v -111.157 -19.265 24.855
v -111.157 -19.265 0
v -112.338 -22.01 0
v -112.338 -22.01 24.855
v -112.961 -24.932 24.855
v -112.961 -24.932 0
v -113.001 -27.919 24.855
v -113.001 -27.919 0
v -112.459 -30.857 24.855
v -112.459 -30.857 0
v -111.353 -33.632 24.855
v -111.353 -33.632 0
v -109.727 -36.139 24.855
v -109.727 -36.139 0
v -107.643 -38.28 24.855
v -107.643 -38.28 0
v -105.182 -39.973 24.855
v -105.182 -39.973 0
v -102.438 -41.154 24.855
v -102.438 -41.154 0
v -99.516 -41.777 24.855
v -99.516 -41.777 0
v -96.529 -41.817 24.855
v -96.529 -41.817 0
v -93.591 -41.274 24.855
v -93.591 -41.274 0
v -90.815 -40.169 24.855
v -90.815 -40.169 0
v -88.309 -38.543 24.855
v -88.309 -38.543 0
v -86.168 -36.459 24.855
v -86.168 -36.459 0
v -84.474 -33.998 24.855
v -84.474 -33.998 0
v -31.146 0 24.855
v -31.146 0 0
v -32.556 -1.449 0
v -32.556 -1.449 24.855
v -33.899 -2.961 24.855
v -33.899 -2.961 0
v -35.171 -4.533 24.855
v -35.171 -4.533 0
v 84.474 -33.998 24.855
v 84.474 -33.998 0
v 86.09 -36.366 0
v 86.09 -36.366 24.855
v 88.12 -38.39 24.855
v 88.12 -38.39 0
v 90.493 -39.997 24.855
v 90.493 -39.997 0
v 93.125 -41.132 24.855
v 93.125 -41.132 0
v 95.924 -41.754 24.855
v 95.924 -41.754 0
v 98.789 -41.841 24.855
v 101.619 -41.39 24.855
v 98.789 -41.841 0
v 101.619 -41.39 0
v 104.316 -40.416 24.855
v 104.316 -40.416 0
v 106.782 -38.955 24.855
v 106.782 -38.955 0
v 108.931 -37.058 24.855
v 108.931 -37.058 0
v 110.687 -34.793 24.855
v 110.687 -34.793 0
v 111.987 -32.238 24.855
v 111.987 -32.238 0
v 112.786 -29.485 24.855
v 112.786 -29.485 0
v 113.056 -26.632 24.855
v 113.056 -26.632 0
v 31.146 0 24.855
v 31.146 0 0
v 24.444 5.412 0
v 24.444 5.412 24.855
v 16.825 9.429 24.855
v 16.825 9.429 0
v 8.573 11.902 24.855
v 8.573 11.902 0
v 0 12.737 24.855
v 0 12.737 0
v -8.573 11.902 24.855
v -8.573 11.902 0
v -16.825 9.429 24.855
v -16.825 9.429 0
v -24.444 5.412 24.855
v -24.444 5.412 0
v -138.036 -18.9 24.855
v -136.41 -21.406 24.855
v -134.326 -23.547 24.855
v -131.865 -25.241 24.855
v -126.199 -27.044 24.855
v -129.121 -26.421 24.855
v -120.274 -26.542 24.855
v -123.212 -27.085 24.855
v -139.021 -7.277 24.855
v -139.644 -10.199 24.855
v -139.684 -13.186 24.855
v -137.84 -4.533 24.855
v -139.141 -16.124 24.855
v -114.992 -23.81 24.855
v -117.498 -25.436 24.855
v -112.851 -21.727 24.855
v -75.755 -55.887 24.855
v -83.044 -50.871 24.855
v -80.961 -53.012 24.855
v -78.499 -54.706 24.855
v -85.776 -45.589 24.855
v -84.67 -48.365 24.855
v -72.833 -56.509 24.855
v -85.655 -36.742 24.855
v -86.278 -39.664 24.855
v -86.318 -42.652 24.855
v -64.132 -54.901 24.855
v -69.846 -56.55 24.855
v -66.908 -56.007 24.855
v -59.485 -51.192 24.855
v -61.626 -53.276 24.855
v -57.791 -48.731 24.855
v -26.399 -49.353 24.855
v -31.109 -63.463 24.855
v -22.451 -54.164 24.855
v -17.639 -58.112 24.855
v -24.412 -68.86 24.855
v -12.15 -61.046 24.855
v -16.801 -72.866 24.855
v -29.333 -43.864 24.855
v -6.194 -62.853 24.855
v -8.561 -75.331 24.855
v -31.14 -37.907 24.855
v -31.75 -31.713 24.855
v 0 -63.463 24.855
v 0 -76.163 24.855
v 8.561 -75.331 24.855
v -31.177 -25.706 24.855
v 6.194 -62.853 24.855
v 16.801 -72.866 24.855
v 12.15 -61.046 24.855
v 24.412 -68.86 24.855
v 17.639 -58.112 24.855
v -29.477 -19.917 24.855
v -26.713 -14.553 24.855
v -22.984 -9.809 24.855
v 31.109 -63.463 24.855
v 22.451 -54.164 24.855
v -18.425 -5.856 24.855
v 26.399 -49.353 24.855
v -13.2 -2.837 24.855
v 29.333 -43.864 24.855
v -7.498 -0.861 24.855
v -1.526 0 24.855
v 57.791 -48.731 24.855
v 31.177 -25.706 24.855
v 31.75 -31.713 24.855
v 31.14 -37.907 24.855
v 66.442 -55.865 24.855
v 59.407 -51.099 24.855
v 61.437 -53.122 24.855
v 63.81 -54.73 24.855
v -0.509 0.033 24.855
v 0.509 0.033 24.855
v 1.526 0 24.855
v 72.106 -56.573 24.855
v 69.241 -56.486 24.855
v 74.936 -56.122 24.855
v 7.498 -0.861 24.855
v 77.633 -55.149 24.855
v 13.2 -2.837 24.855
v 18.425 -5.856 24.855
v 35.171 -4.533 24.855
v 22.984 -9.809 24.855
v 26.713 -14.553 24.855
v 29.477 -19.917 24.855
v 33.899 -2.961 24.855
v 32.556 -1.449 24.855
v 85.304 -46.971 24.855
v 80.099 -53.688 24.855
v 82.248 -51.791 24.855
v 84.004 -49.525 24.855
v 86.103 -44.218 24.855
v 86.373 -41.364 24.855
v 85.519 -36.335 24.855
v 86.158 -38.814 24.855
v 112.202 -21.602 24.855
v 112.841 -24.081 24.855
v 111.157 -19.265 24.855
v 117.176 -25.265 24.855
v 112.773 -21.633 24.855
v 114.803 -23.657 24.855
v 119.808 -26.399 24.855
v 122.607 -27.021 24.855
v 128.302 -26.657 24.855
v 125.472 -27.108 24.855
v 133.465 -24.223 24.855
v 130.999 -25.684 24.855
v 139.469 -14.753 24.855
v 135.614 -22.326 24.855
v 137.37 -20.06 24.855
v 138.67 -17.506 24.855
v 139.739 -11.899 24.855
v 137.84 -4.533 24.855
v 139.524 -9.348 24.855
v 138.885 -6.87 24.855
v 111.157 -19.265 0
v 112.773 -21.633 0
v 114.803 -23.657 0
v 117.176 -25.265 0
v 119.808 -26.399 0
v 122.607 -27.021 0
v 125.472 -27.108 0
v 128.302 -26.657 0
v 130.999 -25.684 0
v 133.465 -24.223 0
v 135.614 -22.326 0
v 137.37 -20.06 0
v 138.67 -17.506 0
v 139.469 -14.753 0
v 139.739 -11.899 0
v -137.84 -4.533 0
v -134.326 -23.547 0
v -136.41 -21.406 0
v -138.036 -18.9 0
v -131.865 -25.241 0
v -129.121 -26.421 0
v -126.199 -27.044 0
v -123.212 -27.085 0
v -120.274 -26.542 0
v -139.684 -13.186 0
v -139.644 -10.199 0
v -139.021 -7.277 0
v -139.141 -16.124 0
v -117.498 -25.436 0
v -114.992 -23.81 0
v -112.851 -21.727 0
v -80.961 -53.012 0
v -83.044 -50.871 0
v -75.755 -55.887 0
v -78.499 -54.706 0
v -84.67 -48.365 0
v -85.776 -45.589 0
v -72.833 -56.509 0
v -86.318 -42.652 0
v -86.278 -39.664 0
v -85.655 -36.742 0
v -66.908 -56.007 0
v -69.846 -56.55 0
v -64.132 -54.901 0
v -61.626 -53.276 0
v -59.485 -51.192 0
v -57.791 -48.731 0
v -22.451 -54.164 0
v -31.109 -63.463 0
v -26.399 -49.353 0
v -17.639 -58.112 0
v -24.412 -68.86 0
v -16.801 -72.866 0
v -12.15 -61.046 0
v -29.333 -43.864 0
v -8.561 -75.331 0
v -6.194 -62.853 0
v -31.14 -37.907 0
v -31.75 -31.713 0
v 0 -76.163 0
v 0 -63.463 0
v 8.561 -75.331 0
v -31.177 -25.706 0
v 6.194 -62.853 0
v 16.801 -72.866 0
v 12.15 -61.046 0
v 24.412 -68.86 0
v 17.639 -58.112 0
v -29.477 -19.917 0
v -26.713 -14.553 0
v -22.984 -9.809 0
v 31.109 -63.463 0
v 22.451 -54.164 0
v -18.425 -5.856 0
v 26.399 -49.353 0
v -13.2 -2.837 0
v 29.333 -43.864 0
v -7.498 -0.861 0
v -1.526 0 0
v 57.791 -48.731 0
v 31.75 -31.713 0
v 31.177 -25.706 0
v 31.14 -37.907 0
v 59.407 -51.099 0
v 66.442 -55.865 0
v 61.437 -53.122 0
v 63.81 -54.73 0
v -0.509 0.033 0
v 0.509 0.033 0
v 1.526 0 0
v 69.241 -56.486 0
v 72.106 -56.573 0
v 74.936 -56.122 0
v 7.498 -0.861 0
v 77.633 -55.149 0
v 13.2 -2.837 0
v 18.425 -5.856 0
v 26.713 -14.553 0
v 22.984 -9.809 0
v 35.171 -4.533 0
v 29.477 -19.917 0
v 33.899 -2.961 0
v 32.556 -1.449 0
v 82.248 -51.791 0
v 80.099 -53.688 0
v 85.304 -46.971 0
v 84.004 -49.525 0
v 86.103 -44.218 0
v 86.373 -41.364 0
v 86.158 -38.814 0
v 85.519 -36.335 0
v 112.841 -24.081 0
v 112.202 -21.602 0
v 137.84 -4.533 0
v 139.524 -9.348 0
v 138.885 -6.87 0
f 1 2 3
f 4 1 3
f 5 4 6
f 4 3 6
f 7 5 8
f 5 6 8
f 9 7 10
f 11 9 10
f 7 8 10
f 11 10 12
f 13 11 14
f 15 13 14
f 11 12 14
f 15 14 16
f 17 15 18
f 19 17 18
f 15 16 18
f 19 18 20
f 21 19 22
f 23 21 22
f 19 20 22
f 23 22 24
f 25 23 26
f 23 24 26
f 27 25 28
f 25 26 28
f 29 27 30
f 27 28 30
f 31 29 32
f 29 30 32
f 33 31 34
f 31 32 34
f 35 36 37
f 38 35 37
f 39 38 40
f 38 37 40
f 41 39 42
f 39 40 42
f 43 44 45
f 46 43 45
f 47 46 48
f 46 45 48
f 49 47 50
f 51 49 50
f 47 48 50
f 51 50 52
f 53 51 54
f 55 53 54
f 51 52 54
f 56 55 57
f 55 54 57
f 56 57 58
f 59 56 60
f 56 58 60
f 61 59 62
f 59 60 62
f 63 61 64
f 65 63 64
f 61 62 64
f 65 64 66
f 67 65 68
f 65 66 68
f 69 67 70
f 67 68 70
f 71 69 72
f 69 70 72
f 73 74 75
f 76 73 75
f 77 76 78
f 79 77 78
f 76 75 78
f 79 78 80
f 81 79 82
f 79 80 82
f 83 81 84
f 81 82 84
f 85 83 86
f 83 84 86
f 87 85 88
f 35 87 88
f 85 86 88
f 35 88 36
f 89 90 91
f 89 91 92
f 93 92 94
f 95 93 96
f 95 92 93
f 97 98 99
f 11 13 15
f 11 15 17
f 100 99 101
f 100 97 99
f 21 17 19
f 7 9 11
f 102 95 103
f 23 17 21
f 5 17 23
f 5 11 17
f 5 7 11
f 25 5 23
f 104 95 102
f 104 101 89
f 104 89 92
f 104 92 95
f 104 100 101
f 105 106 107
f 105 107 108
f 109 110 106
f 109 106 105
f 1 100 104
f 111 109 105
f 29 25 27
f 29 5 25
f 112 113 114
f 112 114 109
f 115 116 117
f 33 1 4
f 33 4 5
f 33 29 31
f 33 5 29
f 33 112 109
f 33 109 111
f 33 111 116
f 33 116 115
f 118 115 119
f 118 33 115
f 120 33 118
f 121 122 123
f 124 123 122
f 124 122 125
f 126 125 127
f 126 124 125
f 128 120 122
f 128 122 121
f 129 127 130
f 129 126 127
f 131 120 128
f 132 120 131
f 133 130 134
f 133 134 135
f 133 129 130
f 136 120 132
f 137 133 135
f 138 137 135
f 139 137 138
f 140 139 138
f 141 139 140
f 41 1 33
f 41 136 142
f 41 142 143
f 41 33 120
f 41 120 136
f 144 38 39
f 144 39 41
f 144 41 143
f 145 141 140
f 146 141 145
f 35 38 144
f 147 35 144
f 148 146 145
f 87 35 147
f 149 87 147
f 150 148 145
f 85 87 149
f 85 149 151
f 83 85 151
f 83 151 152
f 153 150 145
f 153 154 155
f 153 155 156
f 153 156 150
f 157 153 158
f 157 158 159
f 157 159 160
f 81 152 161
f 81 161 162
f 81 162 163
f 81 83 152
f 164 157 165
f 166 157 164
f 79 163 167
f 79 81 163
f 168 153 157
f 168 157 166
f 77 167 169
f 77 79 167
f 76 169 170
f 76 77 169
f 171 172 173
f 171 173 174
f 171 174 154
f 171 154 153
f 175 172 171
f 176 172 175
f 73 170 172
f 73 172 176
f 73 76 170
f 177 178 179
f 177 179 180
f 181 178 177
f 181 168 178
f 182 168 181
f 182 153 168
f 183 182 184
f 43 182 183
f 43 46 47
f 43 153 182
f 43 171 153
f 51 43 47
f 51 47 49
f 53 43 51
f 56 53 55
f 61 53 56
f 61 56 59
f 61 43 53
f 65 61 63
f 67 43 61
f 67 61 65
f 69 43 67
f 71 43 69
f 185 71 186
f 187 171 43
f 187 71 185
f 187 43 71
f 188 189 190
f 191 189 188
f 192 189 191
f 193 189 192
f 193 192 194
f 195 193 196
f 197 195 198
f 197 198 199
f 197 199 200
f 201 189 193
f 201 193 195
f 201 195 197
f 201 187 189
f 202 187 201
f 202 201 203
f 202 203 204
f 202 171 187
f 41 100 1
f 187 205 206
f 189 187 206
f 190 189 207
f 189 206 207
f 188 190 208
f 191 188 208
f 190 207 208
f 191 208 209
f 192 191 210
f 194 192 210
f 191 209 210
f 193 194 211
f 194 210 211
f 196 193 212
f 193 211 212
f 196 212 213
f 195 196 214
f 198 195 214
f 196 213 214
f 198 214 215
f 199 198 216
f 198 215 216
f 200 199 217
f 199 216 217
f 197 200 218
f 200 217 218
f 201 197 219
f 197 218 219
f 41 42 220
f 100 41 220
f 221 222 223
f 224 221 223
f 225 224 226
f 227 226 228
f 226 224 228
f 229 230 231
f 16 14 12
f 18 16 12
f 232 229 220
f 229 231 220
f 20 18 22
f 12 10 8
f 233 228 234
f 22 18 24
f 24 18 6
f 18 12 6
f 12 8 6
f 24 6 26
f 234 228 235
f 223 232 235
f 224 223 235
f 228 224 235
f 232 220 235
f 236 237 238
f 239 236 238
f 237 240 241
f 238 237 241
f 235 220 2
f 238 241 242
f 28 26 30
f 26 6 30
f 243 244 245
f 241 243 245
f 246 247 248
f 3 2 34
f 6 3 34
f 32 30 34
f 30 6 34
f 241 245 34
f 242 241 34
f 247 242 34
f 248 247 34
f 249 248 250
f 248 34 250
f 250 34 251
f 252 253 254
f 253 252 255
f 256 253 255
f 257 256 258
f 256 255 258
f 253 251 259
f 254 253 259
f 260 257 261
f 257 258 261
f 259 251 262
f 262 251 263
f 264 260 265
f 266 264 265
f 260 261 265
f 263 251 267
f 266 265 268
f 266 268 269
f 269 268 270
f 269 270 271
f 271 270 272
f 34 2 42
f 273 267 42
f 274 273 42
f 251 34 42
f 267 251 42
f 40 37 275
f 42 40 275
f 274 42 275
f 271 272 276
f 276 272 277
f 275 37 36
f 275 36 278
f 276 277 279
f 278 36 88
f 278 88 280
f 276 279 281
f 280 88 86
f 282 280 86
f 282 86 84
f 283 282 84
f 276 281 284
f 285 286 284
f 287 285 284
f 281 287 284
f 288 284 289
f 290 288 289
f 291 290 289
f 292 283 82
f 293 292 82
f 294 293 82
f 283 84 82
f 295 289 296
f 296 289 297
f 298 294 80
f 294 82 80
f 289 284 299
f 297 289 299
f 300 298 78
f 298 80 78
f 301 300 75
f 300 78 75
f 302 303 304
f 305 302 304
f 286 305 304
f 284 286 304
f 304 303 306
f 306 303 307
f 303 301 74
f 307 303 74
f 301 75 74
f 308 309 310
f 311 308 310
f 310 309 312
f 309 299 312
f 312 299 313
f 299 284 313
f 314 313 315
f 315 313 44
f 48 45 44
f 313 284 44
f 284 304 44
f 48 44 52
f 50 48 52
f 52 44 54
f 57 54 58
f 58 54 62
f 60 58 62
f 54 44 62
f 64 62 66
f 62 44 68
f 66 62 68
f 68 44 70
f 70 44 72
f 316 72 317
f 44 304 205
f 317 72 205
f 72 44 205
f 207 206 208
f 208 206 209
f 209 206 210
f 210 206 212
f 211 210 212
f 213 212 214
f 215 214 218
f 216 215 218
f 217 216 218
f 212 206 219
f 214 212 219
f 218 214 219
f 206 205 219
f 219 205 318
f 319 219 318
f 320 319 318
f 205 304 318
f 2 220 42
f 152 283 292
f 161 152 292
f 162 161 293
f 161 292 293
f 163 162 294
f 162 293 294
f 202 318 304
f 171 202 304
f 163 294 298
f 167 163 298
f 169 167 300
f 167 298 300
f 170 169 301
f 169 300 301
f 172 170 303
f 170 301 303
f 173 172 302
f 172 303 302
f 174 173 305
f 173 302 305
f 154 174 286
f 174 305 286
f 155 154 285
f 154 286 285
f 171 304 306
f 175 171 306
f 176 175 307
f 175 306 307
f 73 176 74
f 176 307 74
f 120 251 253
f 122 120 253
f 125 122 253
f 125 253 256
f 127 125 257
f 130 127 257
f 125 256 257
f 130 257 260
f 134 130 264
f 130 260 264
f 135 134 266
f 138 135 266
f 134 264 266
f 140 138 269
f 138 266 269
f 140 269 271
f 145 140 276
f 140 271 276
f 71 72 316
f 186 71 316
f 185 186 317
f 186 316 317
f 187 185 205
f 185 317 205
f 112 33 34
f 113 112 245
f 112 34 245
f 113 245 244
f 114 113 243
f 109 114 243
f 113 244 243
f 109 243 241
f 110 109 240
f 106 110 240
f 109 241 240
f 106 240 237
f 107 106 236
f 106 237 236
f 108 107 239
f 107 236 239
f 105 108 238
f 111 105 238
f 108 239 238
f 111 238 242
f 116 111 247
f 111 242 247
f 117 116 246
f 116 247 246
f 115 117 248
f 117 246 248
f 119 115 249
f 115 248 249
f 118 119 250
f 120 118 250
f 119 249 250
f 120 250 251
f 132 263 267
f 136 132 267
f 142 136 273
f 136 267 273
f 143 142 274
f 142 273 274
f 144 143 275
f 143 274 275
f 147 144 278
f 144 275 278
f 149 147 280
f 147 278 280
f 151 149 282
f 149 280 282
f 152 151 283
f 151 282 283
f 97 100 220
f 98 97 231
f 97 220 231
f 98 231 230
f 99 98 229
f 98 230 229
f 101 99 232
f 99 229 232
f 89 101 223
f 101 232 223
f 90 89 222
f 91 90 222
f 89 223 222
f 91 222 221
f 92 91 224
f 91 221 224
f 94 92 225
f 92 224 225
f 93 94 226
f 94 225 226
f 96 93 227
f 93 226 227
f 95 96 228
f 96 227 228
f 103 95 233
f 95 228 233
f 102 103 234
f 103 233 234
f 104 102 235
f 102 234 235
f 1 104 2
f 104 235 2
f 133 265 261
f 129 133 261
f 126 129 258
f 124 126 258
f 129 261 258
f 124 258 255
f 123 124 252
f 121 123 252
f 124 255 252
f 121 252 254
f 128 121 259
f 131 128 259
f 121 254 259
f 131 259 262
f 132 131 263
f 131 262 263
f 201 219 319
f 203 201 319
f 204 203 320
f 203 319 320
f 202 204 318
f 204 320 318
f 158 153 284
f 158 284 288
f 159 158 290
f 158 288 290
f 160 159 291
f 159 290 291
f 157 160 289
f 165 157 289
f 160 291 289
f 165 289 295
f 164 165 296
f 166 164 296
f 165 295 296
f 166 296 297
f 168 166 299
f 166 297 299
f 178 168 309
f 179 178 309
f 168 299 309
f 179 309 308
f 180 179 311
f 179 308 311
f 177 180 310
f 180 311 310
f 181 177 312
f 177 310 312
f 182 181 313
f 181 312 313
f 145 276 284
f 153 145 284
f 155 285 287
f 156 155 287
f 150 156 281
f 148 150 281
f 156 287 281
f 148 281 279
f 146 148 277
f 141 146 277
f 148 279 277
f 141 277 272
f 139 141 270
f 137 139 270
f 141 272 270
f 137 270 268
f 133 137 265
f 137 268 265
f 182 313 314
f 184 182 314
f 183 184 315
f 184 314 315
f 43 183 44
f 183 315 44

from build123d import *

# Parameters (mm, degrees)
F1_DEPTH = 24.85502


# Not quite as in the source:
# - ends of sketch curves that miss each other by under 0.0002 mm in the source are joined


with BuildPart() as f1:
    # F0 (on Top) → F1 (new body)
    with BuildSketch(Plane.XY):
        with BuildLine():
            Line((31.75, -31.7133048595), (44.45, -31.7133048595))
            ThreePointArc((44.45, -31.7133048595), (42.0664322772, -17.3530202013), (35.171359934, -4.5328350256))
            ThreePointArc((35.171359934, -4.5328350256), (33.2360090694, -2.1977123508), (31.1459274206, 0))
            Line((31.1459274206, 0), (1.526038953, 0))
            ThreePointArc((1.526038953, 0), (22.9838447258, -9.8088445461), (31.75, -31.7133048595))
        make_face()
        with BuildLine():
            Line((44.45, -40.8569961303), (44.45, -31.7133048595))
            ThreePointArc((44.45, -31.7133048595), (44.2101126583, -36.3250766164), (43.4930398768, -40.8870708405))
            ThreePointArc((43.4930398768, -40.8870708405), (43.9712837047, -40.8645166634), (44.45, -40.8569961303))
        make_face()
        with BuildLine():
            ThreePointArc((43.4930398768, -40.8870708405), (44.2101126583, -36.3250766164), (44.45, -31.7133048595))
            Line((44.45, -31.7133048595), (31.75, -31.7133048595))
            ThreePointArc((31.75, -31.7133048595), (22.4506403027, -54.1639451622), (0, -63.4633048595))
            Line((0, -63.4633048595), (31.1085197333, -63.4633048595))
            ThreePointArc((31.1085197333, -63.4633048595), (31.0883782789, -48.7672850184), (43.4930398768, -40.8870708405))
        make_face()
        with BuildLine():
            ThreePointArc((35.171359934, -4.5328350256), (42.0664322772, -17.3530202013), (44.45, -31.7133048595))
            Line((44.45, -31.7133048595), (44.45, -4.5328350256))
            Line((44.45, -4.5328350256), (35.171359934, -4.5328350256))
        make_face()
        with BuildLine():
            Line((44.45, -4.5328350256), (44.45, -31.7133048595))
            Line((44.45, -31.7133048595), (44.45, -40.8569961303))
            ThreePointArc((44.45, -40.8569961303), (52.1958071052, -42.9722076639), (57.7914802832, -48.730687431))
            ThreePointArc((57.7914802832, -48.730687431), (63.7666518684, -28.0228983697), (84.4744408875, -33.9980701011))
            ThreePointArc((84.4744408875, -33.9980701011), (90.4496122897, -13.290280973), (111.1574013682, -19.2654525473))
            ThreePointArc((111.1574013682, -19.2654525473), (109.2588815999, -11.8991437909), (111.1574013333, -4.5328350256))
            Line((111.1574013333, -4.5328350256), (44.45, -4.5328350256))
        make_face()
        with BuildLine():
            ThreePointArc((44.45, -40.8569961303), (43.9712837047, -40.8645166634), (43.4930398768, -40.8870708405))
            ThreePointArc((43.4930398768, -40.8870708405), (38.9713966864, -53.0916289358), (31.1085197333, -63.4633048595))
            Line((31.1085197333, -63.4633048595), (44.45, -56.0969961303))
            Line((44.45, -56.0969961303), (44.45, -40.8569961303))
        make_face()
        with BuildLine():
            ThreePointArc((31.1085197333, -63.4633048595), (38.9713966864, -53.0916289358), (43.4930398768, -40.8870708405))
            ThreePointArc((43.4930398768, -40.8870708405), (31.0883782789, -48.7672850184), (31.1085197333, -63.4633048595))
        make_face()
        with BuildLine():
            ThreePointArc((57.7914802832, -48.730687431), (52.1958071052, -42.9722076639), (44.45, -40.8569961303))
            Line((44.45, -40.8569961303), (44.45, -56.0969961303))
            Line((44.45, -56.0969961303), (57.7914802667, -48.7306874011))
        make_face()
        with BuildLine():
            Line((1.526038953, 0), (31.1459274206, 0))
            ThreePointArc((31.1459274206, 0), (0, 12.7366951405), (-31.1459274206, 0))
            Line((-31.1459274206, 0), (-1.526038953, 0))
            ThreePointArc((-1.526038953, 0), (0, 0.0366951405), (1.526038953, 0))
        make_face()
        with BuildLine():
            ThreePointArc((-31.1085197333, -63.4633048595), (0, -76.1633048595), (31.1085197333, -63.4633048595))
            Line((31.1085197333, -63.4633048595), (0, -63.4633048595))
            Line((0, -63.4633048595), (-31.1085197333, -63.4633048595))
        make_face()
        with BuildLine():
            Line((-31.1085197333, -63.4633048595), (0, -63.4633048595))
            ThreePointArc((0, -63.4633048595), (-22.4506403027, -54.1639451622), (-31.75, -31.7133048595))
            Line((-31.75, -31.7133048595), (-44.45, -31.7133048595))
            ThreePointArc((-44.45, -31.7133048595), (-44.2101126583, -36.3250766164), (-43.4930398768, -40.8870708405))
            ThreePointArc((-43.4930398768, -40.8870708405), (-33.340506936, -45.6645101437), (-29.21, -56.0969961303))
            ThreePointArc((-29.21, -56.0969961303), (-29.6922603481, -59.9005103432), (-31.1085197333, -63.4633048595))
        make_face()
        with BuildLine():
            Line((137.8403618666, -4.5328350256), (111.1574013333, -4.5328350256))
            ThreePointArc((111.1574013333, -4.5328350256), (109.2588815999, -11.8991437909), (111.1574013682, -19.2654525473))
            Line((111.1574013333, -19.2654524841), (137.8403618666, -4.5328350256))
        make_face()
        with BuildLine():
            ThreePointArc((84.4744408875, -33.9980701011), (63.7666518684, -28.0228983697), (57.7914802832, -48.730687431))
            Line((57.7914802832, -48.730687431), (84.4744408875, -33.9980701011))
        make_face()
        with BuildLine():
            Line((84.4744408, -33.9980699426), (57.7914802667, -48.7306874011))
            ThreePointArc((57.7914802667, -48.7306874011), (74.9364747628, -56.1221183194), (86.3729605333, -41.3643786718))
            ThreePointArc((86.3729605333, -41.3643786718), (85.8907002078, -37.5608645466), (84.4744408, -33.9980699426))
        make_face()
        with BuildLine():
            Line((-1.526038953, 0), (-31.1459274206, 0))
            ThreePointArc((-31.1459274206, 0), (-33.2360090694, -2.1977123508), (-35.171359934, -4.5328350256))
            ThreePointArc((-35.171359934, -4.5328350256), (-42.0664322772, -17.3530202013), (-44.45, -31.7133048595))
            Line((-44.45, -31.7133048595), (-31.75, -31.7133048595))
            ThreePointArc((-31.75, -31.7133048595), (-22.9838447258, -9.8088445461), (-1.526038953, 0))
        make_face()
        with BuildLine():
            Line((-44.45, -56.0969961303), (-31.1085197333, -63.4633048595))
            ThreePointArc((-31.1085197333, -63.4633048595), (-38.9713966864, -53.0916289358), (-43.4930398768, -40.8870708405))
            ThreePointArc((-43.4930398768, -40.8870708405), (-43.9712837047, -40.8645166634), (-44.45, -40.8569961303))
            Line((-44.45, -40.8569961303), (-44.45, -56.0969961303))
        make_face()
        with BuildLine():
            ThreePointArc((-43.4930398768, -40.8870708405), (-38.9713966864, -53.0916289358), (-31.1085197333, -63.4633048595))
            ThreePointArc((-31.1085197333, -63.4633048595), (-29.6922603481, -59.9005103432), (-29.21, -56.0969961303))
            ThreePointArc((-29.21, -56.0969961303), (-33.340506936, -45.6645101437), (-43.4930398768, -40.8870708405))
        make_face()
        with BuildLine():
            ThreePointArc((113.0559210666, -26.6317612133), (112.5736607275, -22.8282470353), (111.1574013682, -19.2654525473))
            Line((111.1574013682, -19.2654525473), (84.4744408, -33.9980699426))
            ThreePointArc((84.4744408, -33.9980699426), (101.6194353672, -41.3895008426), (113.0559210666, -26.6317612133))
        make_face()
        with BuildLine():
            Line((84.4744408, -33.9980699426), (111.1574013333, -19.2654524841))
            ThreePointArc((111.1574013333, -19.2654524841), (90.4496122897, -13.290280973), (84.4744408, -33.9980699426))
        make_face()
        with BuildLine():
            Line((137.8403618666, -4.5328350256), (111.1574013333, -19.2654524841))
            ThreePointArc((111.1574013682, -19.2654525473), (128.3023958478, -26.6568833977), (139.7388815999, -11.8991437549))
            ThreePointArc((139.7388815999, -11.8991437549), (139.2566212518, -8.0956295419), (137.8403618666, -4.5328350256))
        make_face()
        with BuildLine():
            ThreePointArc((-44.45, -31.7133048595), (-42.0664322772, -17.3530202013), (-35.171359934, -4.5328350256))
            Line((-35.171359934, -4.5328350256), (-111.1574013333, -4.5328350256))
            ThreePointArc((-111.1574013333, -4.5328350256), (-109.7411419481, -8.0956295419), (-109.2588815999, -11.8991437548))
            ThreePointArc((-109.2588815999, -11.8991437548), (-109.7411419274, -15.7026578875), (-111.1574012531, -19.265452339))
            ThreePointArc((-111.1574012531, -19.265452339), (-94.0124067734, -11.8740215822), (-82.5759210666, -26.6317612133))
            ThreePointArc((-82.5759210666, -26.6317612133), (-83.058181437, -30.4352755127), (-84.4744408863, -33.9980700989))
            ThreePointArc((-84.4744408863, -33.9980700989), (-67.3294464068, -26.6066389977), (-55.8929605333, -41.3643786718))
            ThreePointArc((-55.8929605333, -41.3643786718), (-56.3752208889, -45.1678929135), (-57.7914802953, -48.730687453))
            ThreePointArc((-57.7914802953, -48.730687453), (-52.1958071161, -42.9722076703), (-44.45, -40.8569961303))
            Line((-44.45, -40.8569961303), (-44.45, -31.7133048595))
        make_face()
        with BuildLine():
            ThreePointArc((-44.45, -40.8569961303), (-43.9712837047, -40.8645166634), (-43.4930398768, -40.8870708405))
            ThreePointArc((-43.4930398768, -40.8870708405), (-44.2101126583, -36.3250766164), (-44.45, -31.7133048595))
            Line((-44.45, -31.7133048595), (-44.45, -40.8569961303))
        make_face()
        with BuildLine():
            Line((-57.7914802667, -48.7306874011), (-44.45, -56.0969961303))
            Line((-44.45, -56.0969961303), (-44.45, -40.8569961303))
            ThreePointArc((-44.45, -40.8569961303), (-52.1958071161, -42.9722076703), (-57.7914802953, -48.730687453))
        make_face()
        with BuildLine():
            ThreePointArc((-84.4744408863, -33.9980700989), (-78.4992692104, -54.7058589673), (-57.7914802953, -48.730687453))
            Line((-57.7914802953, -48.730687453), (-84.4744408863, -33.9980700989))
        make_face()
        with BuildLine():
            Line((-84.4744408, -33.9980699426), (-57.7914802667, -48.7306874011))
            ThreePointArc((-57.7914802667, -48.7306874011), (-56.3752208889, -45.1678929135), (-55.8929605333, -41.3643786718))
            ThreePointArc((-55.8929605333, -41.3643786718), (-67.3294464068, -26.6066389977), (-84.4744408, -33.9980699426))
        make_face()
        with BuildLine():
            ThreePointArc((-109.2588815999, -11.8991437548), (-109.7411419481, -8.0956295419), (-111.1574013333, -4.5328350256))
            Line((-111.1574013333, -4.5328350256), (-137.8403618666, -4.5328350256))
            Line((-137.8403618666, -4.5328350256), (-111.1574013333, -19.2654524841))
            ThreePointArc((-111.1574013333, -19.2654524841), (-109.7411419274, -15.7026578875), (-109.2588815999, -11.8991437548))
        make_face()
        with BuildLine():
            ThreePointArc((-111.1574012531, -19.265452339), (-105.1822299466, -39.9732413968), (-84.4744408863, -33.9980700989))
            Line((-84.4744408863, -33.9980700989), (-111.1574012531, -19.265452339))
        make_face()
        with BuildLine():
            Line((-111.1574013333, -19.2654524841), (-84.4744408, -33.9980699426))
            ThreePointArc((-84.4744408, -33.9980699426), (-83.058181437, -30.4352755127), (-82.5759210666, -26.6317612133))
            ThreePointArc((-82.5759210666, -26.6317612133), (-94.0124067734, -11.8740215822), (-111.1574013333, -19.2654524841))
        make_face()
        with BuildLine():
            Line((-111.1574013333, -19.2654524841), (-137.8403618666, -4.5328350256))
            ThreePointArc((-137.8403618666, -4.5328350256), (-131.8651902566, -25.2406240616), (-111.1574013333, -19.2654524841))
        make_face()
    extrude(amount=F1_DEPTH)


solid = f1.part
